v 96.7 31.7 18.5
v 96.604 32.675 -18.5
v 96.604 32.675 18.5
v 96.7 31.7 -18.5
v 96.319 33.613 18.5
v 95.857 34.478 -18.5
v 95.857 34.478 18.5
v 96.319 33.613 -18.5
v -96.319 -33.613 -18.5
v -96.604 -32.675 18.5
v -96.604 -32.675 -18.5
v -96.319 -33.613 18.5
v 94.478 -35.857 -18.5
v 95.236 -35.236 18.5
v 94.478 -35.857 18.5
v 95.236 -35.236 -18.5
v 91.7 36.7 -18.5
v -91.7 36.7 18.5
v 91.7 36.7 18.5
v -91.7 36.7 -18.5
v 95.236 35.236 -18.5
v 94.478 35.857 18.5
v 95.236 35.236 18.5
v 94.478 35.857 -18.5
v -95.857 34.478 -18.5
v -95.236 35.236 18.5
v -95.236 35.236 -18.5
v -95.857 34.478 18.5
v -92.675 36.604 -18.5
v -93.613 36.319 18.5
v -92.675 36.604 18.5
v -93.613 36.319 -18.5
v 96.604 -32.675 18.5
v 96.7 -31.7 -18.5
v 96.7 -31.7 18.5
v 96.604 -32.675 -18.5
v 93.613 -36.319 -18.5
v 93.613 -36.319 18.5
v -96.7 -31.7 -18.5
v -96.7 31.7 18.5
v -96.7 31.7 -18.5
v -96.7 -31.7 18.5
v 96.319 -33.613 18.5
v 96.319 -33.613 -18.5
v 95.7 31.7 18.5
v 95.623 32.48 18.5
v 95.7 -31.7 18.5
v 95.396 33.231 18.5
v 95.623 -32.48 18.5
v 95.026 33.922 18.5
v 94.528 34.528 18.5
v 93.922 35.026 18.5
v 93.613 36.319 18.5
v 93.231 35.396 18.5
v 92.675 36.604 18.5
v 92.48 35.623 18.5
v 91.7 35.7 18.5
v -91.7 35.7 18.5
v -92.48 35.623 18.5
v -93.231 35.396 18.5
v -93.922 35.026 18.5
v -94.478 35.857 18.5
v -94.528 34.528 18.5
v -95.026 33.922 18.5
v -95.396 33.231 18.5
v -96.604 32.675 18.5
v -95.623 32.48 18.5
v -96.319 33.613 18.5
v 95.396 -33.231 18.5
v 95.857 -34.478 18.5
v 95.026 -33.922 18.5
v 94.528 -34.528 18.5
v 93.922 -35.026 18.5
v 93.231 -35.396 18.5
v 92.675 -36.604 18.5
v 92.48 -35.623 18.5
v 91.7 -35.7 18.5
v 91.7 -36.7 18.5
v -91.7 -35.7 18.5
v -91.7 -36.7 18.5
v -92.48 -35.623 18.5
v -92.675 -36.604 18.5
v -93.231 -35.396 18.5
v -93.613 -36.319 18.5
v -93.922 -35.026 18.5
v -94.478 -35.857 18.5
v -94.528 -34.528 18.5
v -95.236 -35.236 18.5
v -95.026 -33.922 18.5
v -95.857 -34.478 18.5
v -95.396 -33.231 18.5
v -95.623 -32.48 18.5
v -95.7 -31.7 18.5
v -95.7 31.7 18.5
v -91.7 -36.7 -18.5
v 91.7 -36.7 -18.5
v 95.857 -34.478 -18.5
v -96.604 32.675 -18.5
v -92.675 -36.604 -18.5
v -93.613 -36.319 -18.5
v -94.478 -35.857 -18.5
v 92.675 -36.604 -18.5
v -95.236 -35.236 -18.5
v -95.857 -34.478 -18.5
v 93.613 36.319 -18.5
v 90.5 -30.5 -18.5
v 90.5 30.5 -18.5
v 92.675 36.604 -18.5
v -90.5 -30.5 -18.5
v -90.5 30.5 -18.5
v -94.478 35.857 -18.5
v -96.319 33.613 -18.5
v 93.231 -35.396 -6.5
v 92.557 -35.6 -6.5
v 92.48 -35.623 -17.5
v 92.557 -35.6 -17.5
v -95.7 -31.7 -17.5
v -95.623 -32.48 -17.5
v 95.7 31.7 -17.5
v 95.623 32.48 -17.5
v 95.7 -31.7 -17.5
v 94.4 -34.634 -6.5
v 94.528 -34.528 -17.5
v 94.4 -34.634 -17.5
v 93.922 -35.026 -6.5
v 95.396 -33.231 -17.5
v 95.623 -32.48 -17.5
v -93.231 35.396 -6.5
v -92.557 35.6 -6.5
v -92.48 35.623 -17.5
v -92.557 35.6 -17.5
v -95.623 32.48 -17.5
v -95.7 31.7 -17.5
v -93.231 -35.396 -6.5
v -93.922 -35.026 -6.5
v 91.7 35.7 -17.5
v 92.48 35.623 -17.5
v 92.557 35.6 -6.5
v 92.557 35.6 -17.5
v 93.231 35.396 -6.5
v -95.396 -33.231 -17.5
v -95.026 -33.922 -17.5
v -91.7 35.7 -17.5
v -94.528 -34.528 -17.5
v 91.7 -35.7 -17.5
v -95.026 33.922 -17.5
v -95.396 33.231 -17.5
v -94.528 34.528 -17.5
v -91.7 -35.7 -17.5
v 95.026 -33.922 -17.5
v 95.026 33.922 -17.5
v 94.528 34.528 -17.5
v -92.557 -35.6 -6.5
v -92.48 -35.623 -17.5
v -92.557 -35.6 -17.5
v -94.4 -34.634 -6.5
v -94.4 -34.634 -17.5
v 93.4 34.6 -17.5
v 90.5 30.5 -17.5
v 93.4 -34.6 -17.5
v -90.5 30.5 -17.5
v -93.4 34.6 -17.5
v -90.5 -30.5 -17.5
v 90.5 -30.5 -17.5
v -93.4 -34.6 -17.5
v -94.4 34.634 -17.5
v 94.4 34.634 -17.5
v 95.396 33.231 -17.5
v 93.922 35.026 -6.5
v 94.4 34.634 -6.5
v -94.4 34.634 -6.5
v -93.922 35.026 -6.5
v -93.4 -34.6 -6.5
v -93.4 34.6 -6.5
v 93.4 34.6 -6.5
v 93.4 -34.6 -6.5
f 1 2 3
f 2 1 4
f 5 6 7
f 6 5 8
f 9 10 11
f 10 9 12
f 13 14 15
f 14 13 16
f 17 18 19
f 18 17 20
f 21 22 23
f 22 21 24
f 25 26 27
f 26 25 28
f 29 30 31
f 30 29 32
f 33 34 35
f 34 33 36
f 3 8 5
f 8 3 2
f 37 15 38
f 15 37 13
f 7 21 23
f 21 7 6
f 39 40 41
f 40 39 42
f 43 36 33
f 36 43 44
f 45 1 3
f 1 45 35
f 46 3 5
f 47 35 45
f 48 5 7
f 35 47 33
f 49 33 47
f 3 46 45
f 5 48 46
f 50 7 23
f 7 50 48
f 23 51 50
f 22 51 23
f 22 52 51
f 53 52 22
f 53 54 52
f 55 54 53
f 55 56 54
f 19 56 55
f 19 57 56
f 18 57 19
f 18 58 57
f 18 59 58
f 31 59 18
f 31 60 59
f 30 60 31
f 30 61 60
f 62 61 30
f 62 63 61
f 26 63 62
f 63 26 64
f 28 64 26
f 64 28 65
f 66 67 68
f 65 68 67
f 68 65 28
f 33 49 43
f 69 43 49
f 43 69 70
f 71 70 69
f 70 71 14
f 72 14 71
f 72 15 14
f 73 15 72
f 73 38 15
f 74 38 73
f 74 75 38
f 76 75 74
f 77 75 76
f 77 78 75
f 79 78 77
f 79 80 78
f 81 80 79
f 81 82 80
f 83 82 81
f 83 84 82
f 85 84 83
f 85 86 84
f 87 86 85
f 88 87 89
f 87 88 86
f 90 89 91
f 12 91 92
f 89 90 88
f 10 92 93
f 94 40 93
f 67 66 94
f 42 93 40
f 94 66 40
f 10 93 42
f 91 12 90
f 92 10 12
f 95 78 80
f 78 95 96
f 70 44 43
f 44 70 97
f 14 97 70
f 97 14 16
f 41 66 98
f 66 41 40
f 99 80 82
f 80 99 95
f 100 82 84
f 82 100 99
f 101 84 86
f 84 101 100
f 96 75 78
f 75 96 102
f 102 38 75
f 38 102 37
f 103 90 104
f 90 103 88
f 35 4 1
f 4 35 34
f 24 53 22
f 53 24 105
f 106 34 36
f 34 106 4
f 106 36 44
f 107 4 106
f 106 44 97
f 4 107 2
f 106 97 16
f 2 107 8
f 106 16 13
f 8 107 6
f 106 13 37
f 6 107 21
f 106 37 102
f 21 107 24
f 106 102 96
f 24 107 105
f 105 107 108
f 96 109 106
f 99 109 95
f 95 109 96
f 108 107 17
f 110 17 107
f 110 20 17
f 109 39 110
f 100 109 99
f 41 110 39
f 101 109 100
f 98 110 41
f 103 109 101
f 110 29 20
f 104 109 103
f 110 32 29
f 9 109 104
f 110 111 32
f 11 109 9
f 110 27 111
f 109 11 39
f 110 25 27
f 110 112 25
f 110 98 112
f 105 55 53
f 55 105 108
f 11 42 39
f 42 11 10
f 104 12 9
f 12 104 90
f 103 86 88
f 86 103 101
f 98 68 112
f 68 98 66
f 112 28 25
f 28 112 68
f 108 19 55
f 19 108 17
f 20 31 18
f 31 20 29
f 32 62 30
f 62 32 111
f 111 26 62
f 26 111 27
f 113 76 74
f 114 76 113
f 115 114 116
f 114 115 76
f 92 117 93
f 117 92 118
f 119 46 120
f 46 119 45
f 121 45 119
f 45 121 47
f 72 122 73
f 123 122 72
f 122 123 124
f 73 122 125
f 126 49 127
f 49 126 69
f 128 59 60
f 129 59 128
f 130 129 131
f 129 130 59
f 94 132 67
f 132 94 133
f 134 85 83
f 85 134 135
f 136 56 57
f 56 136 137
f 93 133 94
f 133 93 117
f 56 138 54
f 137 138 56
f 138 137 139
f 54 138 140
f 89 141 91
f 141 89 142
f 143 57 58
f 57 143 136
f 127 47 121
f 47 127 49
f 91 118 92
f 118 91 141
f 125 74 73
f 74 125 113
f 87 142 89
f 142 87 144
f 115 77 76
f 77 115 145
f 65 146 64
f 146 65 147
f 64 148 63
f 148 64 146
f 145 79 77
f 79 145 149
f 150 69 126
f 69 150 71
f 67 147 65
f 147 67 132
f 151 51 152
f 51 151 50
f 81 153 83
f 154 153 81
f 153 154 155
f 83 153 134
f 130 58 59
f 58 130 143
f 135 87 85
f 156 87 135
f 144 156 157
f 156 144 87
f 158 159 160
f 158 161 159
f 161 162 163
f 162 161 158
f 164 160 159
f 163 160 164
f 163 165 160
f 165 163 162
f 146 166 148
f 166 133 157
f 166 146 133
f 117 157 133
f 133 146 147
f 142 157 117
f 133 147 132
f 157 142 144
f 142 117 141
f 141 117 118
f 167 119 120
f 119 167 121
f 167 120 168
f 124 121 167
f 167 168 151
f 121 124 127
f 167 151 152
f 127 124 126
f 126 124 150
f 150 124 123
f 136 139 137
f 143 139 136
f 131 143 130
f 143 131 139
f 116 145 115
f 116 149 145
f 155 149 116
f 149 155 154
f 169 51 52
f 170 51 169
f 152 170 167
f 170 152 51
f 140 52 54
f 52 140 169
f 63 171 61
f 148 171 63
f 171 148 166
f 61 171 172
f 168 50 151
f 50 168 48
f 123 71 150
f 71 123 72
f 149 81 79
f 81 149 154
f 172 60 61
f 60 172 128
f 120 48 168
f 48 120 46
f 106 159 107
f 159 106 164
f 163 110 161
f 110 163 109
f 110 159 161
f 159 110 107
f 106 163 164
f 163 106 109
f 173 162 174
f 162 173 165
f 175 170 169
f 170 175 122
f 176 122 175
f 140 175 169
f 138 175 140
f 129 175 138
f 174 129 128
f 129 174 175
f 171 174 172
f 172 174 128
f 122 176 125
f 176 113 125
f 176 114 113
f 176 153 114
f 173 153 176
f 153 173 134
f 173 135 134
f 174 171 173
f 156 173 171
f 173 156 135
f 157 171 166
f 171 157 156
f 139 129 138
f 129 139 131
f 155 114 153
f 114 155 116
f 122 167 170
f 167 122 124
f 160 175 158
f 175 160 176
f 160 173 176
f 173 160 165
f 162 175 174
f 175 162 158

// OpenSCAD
// file: grid.scad
module grid(size, dim, thick, center) {
    width = size[0];
    depth = size[1];
    height = size[2];
    
    nx = dim[0];
    ny = dim[1];
    
    tx = thick[0];
    ty = thick[1];
    
    dx = center?-width/2:0;
    dy = center?-depth/2:0;
    dz = center?-height/2:0;

    translate([dx,dy,dz])
        union() {
            for(xi = [0:nx])
                translate([(width-tx)/nx*xi,0,0])
                    cube([tx,depth,height]);
            for(yi = [0:ny])
                translate([0,(depth-ty)/ny*yi,0])
                    cube([width,ty,height]);
        }
}
// file: rcube.scad
module scube(size, radius, center) {
    width = size[0];
    depth = size[1];
    height = size[2];
    
    dx = center?-width/2:0;
    dy = center?-depth/2:0;
    dz = center?-height/2:0;
    
    x0 = radius;
    x1 = width - radius;
    y0 = radius;
    y1 = depth - radius;
    z0 = radius;
    z1 = height - radius;
    
    spheres = [[x0,y0,z0],[x0,y1,z0],[x1,y1,z0],[x1,y0,z0],[x0,y0,z1],[x0,y1,z1],[x1,y1,z1],[x1,y0,z1]];
    
    translate([dx,dy,dz]) {
        hull()
            for (sphere = spheres) {
                translate(sphere)
                    sphere(radius);
            }
    }
}

module ccube(size, radius, center) {
    width = size[0];
    depth = size[1];
    height = size[2];
    
    dx = center?-width/2:0;
    dy = center?-depth/2:0;
    dz = center?-height/2:0;
    
    x0 = radius;
    x1 = width - radius;
    y0 = radius;
    y1 = depth - radius;
    
    cylinders = [[x0,y0,0],[x0,y1,0],[x1,y1,0],[x1,y0,0]];
    
    translate([dx,dy,dz]) {
        hull()
            for (cylinder = cylinders) {
                translate(cylinder)
                    cylinder(height, r=radius, center=false);
            }
    }
}
// main file
use <rcube.scad>;
use <grid.scad>;

    xn = 17;
    yn = 5;
    cx = 10;
    cy = 10;
    width = xn*cx;
    depth = yn*cy;
    height = 5;
    
    th = 0.6;
    wallth = 1;
    
    pcbborder = 7.8;
    pcbth = 2;
    glassth = 4;
    
    delta = 0.6;    
    
    gridstuffheight = glassth+height+pcbth;
    bodywidth = width+3*pcbborder;
    bodydepth = depth+3*pcbborder;
    bodyheight = wallth+gridstuffheight+25;

    hoodheight = 20;
    
    batterysize = [68,20,20];
    batterypos = [0,-20,7];
    
    speakerpos = [-73,13,10];
    speakersize = 38;
    
    powerpos = [33,18,10];
    powersize = [];
    
    sensorpos = [-67,-20,10];
    
    ad = 3.1;
    sd = 3.5;

module clockgrid() {
    difference() {
    union() {
    translate([-88.5,0,-11]) {
        cylinder(d=6.5, h=height, $fn=32);
    }
    translate([88.5,0,-11]) {
        cylinder(d=6.5, h=height, $fn=32);
    }
    translate([0,28.5,-8.5]) {
        cube([8,7,height], true);
    }
    translate([0,-28.5,-8.5]) {
        cube([8,7,height], true);
    }

    translate([0,0,-(bodyheight-gridstuffheight)/2+wallth])
    translate([0,0,(glassth-pcbth)/2]){
    
    color("grey", alpha=1) {
        union() {
            grid([width,depth,height],[xn,yn],[th,th],true);
            grid([width+2*pcbborder,depth+2*pcbborder,height],[1,1],[wallth,wallth],true);
            translate([0,0,(-height+wallth)/2])
                grid([width+2*pcbborder,depth+2*pcbborder,wallth],[1,1],[pcbborder,pcbborder],true);
        }
    }
}
/*
    color("white", alpha=0.1) {
        translate([0,0,(-height-glassth)/2])
            cube([width+2*pcbborder,depth+2*pcbborder,glassth],true);
    }
    color("green", alpha=0.5) {
        translate([0,0,(height+pcbth)/2])
            cube([width+2*pcbborder,depth+2*pcbborder,pcbth],true);
    }
 */
    }
    
    
    translate([88.5,0,-12]) {
        cylinder(d=5.3, h=height+2, $fn=32);
    }    
    translate([-88.5,0,-12]) {
        cylinder(d=5.3, h=height+2, $fn=32);
    }
    
    translate([0,28.5,-8.5]) {
        cube([7,6,height+2], true);
    }
    translate([0,-28.5,-8.5]) {
        cube([7,6,height+2], true);
    }

}
}

module cbody(size,radius,wallth) {
    width = size[0];
    depth = size[1];
    height = size[2];
    
    difference() {
        ccube([width,depth,height], radius, center=true, $fn=32);
        translate([0,0,wallth])
            ccube([width-2*wallth,depth-2*wallth,height], radius-wallth, center=true, $fn=32);
    }
}

module clockbody() {
    color("grey", alpha=1) {
        difference() {
            cbody([bodywidth,bodydepth,bodyheight],5,wallth);
            cube([width+11,depth+11,bodyheight+1],true);
        }

        translate([0,0,-(bodyheight-gridstuffheight)/2+wallth])
            grid([width+2*pcbborder+2*wallth+2*delta,depth+2*pcbborder+2*wallth+2*delta+2.4,gridstuffheight],[1,1],[wallth,wallth],true);
    }
}



module addbattery() {
    difference() {
        union() {
            children();
            translate(batterypos)
                grid([batterysize[0]+wallth*2,batterysize[1]+wallth*2,batterysize[2]],[1,1],[wallth,wallth],true);
        }
        translate(batterypos) {
            for (nx = [-5:5])
                for (ny = [-1:1])
                    translate([nx*5.6,ny*3.3,-7])
                        cylinder(d=ad, h=20, $fn=6);
            for (nx = [-4.5:4.5])
                for (ny = [-1.5:1.5])
                    translate([nx*5.6,ny*3.3,-7])
                        cylinder(d=ad, h=20, $fn=6);
        }
    }
}

module addspeaker() {
    difference() {
        union() {
            children();
                translate(speakerpos)
                    difference() {
                        cylinder(d=speakersize+2*wallth, h=6, $fn=32);
                        translate([0,0,-1])
                            cylinder(d=speakersize, h=8, $fn=64);
                    }
        }
        for (nx = [-2:2])
            for (ny = [-3:3])
                translate([speakerpos[0]+nx*5.6,speakerpos[1]+ny*3.3,speakerpos[2]])
                    cylinder(d=ad, h=20, $fn=6);
        for (nx = [-1.5:1.5])
            for (ny = [-3.5:3.5])
                translate([speakerpos[0]+nx*5.6,speakerpos[1]+ny*3.3,speakerpos[2]])
                    cylinder(d=ad, h=20, $fn=6);

    }
}

module addsensor() {
    difference() {
        union() {
            translate(sensorpos)
                grid([50,24,14],[1,1],[wallth,wallth],true);
            children();
        }
        translate(sensorpos) {
            for (nx = [-3:3])
                for (ny = [-2:2])
                    translate([nx*5.6,ny*3.3,0])
                        cylinder(d=ad, h=20, $fn=6);        
            for (nx = [-2.5:2.5])
                for (ny = [-1.5:1.5])
                    translate([nx*5.6,ny*3.3,0])
                        cylinder(d=ad, h=20, $fn=6);        
        }
    }
}

module addkeys() {
    difference() {
        union() {
            children();
            translate([90,-30,14])
                cylinder(d=7, h=3, $fn=32);
            translate([90,30,14])
                cylinder(d=7, h=3, $fn=32);
            translate([70,-30,14])
                cylinder(d=7, h=3, $fn=32);
            translate([70,30,14])
                cylinder(d=7, h=3, $fn=32);
            translate([78,0,16])
                cube([23,12*4,2],true);

        }
        translate([90,-30,0])
            cylinder(d=sd, h=20, $fn=32);
        translate([90,30,0])
            cylinder(d=sd, h=20, $fn=32);
        translate([70,-30,0])
            cylinder(d=sd, h=20, $fn=32);
        translate([70,30,0])
            cylinder(d=sd, h=20, $fn=32);        
        
        translate([90-1,-24,0])
            cube([1,12*4,20]);
        for (nx = [-2:2])
            translate([65,-0.5+12*nx,0])
                cube([25,1,20]);
        for (nx = [-1.5:1.5]) {
            translate([65,3+12*nx,0])
                cube([1,3,20]);
            translate([65,-6+12*nx,0])
                cube([1,3,20]);
        }
    }
}

module addpower() {
    difference() {
        union() {
            translate(powerpos)
                grid([56,28,14],[1,1],[wallth,wallth],true);
            children();
            translate(powerpos) {
                translate([-23,-9,4])
                    cylinder(d=7, h=3, $fn=32);
                translate([+23,-9,4])
                    cylinder(d=7, h=3, $fn=32);
                translate([-23,+9,4])
                    cylinder(d=7, h=3, $fn=32);
                translate([+23,+9,4])
                    cylinder(d=7, h=3, $fn=32);            
            }
        }

        translate(powerpos) {
            translate([-23,-9,0])
                cylinder(d=sd, h=20, $fn=32);
            translate([23,-9,0])
                cylinder(d=sd, h=20, $fn=32);
            translate([-23,9,0])
                cylinder(d=sd, h=20, $fn=32);
            translate([23,9,0])
                cylinder(d=sd, h=20, $fn=32);
            for (nx = [-3:3])
                for (ny = [-1:1])
                    translate([nx*5.6,ny*3.3,0])
                        cylinder(d=ad, h=20, $fn=6);        
            for (nx = [-2.5:2.5])
                for (ny = [-1.5:1.5])
                    translate([nx*5.6,ny*3.3,0])
                        cylinder(d=ad, h=20, $fn=6);        
        }
    }
}

module addpowercordholder() {
    difference() {
        union() {
            children();
            translate([0,30,13])
                cylinder(d=7, h=4, $fn=32);
        }
        translate([0,30,0])
            cylinder(d=4, h=20, $fn=32);
    }
}


module clockhood() {
    difference() {
        union() {
            translate([0,0,(bodyheight-hoodheight)/2+wallth]) {
                translate([0,0,(hoodheight-wallth)/2])
                    ccube([bodywidth,bodydepth,wallth], 5, center=true, $fn=32);
                difference() {
                    ccube([bodywidth-2*wallth-2*delta,bodydepth-2*wallth-2*delta,hoodheight], 5-wallth-delta, center=true, $fn=32);
                    translate([0,0,-wallth])
                        ccube([bodywidth-4*wallth-2*delta,bodydepth-4*wallth-2*delta,hoodheight], 5-2*wallth-delta, center=true, $fn=32);
                }
            }
        }
    }
}

//clockgrid();
clockbody();
/*
addsensor()
addkeys()
addpower()
addspeaker()
addbattery()
addpowercordholder()
color("grey", alpha=1)
clockhood();
*/
